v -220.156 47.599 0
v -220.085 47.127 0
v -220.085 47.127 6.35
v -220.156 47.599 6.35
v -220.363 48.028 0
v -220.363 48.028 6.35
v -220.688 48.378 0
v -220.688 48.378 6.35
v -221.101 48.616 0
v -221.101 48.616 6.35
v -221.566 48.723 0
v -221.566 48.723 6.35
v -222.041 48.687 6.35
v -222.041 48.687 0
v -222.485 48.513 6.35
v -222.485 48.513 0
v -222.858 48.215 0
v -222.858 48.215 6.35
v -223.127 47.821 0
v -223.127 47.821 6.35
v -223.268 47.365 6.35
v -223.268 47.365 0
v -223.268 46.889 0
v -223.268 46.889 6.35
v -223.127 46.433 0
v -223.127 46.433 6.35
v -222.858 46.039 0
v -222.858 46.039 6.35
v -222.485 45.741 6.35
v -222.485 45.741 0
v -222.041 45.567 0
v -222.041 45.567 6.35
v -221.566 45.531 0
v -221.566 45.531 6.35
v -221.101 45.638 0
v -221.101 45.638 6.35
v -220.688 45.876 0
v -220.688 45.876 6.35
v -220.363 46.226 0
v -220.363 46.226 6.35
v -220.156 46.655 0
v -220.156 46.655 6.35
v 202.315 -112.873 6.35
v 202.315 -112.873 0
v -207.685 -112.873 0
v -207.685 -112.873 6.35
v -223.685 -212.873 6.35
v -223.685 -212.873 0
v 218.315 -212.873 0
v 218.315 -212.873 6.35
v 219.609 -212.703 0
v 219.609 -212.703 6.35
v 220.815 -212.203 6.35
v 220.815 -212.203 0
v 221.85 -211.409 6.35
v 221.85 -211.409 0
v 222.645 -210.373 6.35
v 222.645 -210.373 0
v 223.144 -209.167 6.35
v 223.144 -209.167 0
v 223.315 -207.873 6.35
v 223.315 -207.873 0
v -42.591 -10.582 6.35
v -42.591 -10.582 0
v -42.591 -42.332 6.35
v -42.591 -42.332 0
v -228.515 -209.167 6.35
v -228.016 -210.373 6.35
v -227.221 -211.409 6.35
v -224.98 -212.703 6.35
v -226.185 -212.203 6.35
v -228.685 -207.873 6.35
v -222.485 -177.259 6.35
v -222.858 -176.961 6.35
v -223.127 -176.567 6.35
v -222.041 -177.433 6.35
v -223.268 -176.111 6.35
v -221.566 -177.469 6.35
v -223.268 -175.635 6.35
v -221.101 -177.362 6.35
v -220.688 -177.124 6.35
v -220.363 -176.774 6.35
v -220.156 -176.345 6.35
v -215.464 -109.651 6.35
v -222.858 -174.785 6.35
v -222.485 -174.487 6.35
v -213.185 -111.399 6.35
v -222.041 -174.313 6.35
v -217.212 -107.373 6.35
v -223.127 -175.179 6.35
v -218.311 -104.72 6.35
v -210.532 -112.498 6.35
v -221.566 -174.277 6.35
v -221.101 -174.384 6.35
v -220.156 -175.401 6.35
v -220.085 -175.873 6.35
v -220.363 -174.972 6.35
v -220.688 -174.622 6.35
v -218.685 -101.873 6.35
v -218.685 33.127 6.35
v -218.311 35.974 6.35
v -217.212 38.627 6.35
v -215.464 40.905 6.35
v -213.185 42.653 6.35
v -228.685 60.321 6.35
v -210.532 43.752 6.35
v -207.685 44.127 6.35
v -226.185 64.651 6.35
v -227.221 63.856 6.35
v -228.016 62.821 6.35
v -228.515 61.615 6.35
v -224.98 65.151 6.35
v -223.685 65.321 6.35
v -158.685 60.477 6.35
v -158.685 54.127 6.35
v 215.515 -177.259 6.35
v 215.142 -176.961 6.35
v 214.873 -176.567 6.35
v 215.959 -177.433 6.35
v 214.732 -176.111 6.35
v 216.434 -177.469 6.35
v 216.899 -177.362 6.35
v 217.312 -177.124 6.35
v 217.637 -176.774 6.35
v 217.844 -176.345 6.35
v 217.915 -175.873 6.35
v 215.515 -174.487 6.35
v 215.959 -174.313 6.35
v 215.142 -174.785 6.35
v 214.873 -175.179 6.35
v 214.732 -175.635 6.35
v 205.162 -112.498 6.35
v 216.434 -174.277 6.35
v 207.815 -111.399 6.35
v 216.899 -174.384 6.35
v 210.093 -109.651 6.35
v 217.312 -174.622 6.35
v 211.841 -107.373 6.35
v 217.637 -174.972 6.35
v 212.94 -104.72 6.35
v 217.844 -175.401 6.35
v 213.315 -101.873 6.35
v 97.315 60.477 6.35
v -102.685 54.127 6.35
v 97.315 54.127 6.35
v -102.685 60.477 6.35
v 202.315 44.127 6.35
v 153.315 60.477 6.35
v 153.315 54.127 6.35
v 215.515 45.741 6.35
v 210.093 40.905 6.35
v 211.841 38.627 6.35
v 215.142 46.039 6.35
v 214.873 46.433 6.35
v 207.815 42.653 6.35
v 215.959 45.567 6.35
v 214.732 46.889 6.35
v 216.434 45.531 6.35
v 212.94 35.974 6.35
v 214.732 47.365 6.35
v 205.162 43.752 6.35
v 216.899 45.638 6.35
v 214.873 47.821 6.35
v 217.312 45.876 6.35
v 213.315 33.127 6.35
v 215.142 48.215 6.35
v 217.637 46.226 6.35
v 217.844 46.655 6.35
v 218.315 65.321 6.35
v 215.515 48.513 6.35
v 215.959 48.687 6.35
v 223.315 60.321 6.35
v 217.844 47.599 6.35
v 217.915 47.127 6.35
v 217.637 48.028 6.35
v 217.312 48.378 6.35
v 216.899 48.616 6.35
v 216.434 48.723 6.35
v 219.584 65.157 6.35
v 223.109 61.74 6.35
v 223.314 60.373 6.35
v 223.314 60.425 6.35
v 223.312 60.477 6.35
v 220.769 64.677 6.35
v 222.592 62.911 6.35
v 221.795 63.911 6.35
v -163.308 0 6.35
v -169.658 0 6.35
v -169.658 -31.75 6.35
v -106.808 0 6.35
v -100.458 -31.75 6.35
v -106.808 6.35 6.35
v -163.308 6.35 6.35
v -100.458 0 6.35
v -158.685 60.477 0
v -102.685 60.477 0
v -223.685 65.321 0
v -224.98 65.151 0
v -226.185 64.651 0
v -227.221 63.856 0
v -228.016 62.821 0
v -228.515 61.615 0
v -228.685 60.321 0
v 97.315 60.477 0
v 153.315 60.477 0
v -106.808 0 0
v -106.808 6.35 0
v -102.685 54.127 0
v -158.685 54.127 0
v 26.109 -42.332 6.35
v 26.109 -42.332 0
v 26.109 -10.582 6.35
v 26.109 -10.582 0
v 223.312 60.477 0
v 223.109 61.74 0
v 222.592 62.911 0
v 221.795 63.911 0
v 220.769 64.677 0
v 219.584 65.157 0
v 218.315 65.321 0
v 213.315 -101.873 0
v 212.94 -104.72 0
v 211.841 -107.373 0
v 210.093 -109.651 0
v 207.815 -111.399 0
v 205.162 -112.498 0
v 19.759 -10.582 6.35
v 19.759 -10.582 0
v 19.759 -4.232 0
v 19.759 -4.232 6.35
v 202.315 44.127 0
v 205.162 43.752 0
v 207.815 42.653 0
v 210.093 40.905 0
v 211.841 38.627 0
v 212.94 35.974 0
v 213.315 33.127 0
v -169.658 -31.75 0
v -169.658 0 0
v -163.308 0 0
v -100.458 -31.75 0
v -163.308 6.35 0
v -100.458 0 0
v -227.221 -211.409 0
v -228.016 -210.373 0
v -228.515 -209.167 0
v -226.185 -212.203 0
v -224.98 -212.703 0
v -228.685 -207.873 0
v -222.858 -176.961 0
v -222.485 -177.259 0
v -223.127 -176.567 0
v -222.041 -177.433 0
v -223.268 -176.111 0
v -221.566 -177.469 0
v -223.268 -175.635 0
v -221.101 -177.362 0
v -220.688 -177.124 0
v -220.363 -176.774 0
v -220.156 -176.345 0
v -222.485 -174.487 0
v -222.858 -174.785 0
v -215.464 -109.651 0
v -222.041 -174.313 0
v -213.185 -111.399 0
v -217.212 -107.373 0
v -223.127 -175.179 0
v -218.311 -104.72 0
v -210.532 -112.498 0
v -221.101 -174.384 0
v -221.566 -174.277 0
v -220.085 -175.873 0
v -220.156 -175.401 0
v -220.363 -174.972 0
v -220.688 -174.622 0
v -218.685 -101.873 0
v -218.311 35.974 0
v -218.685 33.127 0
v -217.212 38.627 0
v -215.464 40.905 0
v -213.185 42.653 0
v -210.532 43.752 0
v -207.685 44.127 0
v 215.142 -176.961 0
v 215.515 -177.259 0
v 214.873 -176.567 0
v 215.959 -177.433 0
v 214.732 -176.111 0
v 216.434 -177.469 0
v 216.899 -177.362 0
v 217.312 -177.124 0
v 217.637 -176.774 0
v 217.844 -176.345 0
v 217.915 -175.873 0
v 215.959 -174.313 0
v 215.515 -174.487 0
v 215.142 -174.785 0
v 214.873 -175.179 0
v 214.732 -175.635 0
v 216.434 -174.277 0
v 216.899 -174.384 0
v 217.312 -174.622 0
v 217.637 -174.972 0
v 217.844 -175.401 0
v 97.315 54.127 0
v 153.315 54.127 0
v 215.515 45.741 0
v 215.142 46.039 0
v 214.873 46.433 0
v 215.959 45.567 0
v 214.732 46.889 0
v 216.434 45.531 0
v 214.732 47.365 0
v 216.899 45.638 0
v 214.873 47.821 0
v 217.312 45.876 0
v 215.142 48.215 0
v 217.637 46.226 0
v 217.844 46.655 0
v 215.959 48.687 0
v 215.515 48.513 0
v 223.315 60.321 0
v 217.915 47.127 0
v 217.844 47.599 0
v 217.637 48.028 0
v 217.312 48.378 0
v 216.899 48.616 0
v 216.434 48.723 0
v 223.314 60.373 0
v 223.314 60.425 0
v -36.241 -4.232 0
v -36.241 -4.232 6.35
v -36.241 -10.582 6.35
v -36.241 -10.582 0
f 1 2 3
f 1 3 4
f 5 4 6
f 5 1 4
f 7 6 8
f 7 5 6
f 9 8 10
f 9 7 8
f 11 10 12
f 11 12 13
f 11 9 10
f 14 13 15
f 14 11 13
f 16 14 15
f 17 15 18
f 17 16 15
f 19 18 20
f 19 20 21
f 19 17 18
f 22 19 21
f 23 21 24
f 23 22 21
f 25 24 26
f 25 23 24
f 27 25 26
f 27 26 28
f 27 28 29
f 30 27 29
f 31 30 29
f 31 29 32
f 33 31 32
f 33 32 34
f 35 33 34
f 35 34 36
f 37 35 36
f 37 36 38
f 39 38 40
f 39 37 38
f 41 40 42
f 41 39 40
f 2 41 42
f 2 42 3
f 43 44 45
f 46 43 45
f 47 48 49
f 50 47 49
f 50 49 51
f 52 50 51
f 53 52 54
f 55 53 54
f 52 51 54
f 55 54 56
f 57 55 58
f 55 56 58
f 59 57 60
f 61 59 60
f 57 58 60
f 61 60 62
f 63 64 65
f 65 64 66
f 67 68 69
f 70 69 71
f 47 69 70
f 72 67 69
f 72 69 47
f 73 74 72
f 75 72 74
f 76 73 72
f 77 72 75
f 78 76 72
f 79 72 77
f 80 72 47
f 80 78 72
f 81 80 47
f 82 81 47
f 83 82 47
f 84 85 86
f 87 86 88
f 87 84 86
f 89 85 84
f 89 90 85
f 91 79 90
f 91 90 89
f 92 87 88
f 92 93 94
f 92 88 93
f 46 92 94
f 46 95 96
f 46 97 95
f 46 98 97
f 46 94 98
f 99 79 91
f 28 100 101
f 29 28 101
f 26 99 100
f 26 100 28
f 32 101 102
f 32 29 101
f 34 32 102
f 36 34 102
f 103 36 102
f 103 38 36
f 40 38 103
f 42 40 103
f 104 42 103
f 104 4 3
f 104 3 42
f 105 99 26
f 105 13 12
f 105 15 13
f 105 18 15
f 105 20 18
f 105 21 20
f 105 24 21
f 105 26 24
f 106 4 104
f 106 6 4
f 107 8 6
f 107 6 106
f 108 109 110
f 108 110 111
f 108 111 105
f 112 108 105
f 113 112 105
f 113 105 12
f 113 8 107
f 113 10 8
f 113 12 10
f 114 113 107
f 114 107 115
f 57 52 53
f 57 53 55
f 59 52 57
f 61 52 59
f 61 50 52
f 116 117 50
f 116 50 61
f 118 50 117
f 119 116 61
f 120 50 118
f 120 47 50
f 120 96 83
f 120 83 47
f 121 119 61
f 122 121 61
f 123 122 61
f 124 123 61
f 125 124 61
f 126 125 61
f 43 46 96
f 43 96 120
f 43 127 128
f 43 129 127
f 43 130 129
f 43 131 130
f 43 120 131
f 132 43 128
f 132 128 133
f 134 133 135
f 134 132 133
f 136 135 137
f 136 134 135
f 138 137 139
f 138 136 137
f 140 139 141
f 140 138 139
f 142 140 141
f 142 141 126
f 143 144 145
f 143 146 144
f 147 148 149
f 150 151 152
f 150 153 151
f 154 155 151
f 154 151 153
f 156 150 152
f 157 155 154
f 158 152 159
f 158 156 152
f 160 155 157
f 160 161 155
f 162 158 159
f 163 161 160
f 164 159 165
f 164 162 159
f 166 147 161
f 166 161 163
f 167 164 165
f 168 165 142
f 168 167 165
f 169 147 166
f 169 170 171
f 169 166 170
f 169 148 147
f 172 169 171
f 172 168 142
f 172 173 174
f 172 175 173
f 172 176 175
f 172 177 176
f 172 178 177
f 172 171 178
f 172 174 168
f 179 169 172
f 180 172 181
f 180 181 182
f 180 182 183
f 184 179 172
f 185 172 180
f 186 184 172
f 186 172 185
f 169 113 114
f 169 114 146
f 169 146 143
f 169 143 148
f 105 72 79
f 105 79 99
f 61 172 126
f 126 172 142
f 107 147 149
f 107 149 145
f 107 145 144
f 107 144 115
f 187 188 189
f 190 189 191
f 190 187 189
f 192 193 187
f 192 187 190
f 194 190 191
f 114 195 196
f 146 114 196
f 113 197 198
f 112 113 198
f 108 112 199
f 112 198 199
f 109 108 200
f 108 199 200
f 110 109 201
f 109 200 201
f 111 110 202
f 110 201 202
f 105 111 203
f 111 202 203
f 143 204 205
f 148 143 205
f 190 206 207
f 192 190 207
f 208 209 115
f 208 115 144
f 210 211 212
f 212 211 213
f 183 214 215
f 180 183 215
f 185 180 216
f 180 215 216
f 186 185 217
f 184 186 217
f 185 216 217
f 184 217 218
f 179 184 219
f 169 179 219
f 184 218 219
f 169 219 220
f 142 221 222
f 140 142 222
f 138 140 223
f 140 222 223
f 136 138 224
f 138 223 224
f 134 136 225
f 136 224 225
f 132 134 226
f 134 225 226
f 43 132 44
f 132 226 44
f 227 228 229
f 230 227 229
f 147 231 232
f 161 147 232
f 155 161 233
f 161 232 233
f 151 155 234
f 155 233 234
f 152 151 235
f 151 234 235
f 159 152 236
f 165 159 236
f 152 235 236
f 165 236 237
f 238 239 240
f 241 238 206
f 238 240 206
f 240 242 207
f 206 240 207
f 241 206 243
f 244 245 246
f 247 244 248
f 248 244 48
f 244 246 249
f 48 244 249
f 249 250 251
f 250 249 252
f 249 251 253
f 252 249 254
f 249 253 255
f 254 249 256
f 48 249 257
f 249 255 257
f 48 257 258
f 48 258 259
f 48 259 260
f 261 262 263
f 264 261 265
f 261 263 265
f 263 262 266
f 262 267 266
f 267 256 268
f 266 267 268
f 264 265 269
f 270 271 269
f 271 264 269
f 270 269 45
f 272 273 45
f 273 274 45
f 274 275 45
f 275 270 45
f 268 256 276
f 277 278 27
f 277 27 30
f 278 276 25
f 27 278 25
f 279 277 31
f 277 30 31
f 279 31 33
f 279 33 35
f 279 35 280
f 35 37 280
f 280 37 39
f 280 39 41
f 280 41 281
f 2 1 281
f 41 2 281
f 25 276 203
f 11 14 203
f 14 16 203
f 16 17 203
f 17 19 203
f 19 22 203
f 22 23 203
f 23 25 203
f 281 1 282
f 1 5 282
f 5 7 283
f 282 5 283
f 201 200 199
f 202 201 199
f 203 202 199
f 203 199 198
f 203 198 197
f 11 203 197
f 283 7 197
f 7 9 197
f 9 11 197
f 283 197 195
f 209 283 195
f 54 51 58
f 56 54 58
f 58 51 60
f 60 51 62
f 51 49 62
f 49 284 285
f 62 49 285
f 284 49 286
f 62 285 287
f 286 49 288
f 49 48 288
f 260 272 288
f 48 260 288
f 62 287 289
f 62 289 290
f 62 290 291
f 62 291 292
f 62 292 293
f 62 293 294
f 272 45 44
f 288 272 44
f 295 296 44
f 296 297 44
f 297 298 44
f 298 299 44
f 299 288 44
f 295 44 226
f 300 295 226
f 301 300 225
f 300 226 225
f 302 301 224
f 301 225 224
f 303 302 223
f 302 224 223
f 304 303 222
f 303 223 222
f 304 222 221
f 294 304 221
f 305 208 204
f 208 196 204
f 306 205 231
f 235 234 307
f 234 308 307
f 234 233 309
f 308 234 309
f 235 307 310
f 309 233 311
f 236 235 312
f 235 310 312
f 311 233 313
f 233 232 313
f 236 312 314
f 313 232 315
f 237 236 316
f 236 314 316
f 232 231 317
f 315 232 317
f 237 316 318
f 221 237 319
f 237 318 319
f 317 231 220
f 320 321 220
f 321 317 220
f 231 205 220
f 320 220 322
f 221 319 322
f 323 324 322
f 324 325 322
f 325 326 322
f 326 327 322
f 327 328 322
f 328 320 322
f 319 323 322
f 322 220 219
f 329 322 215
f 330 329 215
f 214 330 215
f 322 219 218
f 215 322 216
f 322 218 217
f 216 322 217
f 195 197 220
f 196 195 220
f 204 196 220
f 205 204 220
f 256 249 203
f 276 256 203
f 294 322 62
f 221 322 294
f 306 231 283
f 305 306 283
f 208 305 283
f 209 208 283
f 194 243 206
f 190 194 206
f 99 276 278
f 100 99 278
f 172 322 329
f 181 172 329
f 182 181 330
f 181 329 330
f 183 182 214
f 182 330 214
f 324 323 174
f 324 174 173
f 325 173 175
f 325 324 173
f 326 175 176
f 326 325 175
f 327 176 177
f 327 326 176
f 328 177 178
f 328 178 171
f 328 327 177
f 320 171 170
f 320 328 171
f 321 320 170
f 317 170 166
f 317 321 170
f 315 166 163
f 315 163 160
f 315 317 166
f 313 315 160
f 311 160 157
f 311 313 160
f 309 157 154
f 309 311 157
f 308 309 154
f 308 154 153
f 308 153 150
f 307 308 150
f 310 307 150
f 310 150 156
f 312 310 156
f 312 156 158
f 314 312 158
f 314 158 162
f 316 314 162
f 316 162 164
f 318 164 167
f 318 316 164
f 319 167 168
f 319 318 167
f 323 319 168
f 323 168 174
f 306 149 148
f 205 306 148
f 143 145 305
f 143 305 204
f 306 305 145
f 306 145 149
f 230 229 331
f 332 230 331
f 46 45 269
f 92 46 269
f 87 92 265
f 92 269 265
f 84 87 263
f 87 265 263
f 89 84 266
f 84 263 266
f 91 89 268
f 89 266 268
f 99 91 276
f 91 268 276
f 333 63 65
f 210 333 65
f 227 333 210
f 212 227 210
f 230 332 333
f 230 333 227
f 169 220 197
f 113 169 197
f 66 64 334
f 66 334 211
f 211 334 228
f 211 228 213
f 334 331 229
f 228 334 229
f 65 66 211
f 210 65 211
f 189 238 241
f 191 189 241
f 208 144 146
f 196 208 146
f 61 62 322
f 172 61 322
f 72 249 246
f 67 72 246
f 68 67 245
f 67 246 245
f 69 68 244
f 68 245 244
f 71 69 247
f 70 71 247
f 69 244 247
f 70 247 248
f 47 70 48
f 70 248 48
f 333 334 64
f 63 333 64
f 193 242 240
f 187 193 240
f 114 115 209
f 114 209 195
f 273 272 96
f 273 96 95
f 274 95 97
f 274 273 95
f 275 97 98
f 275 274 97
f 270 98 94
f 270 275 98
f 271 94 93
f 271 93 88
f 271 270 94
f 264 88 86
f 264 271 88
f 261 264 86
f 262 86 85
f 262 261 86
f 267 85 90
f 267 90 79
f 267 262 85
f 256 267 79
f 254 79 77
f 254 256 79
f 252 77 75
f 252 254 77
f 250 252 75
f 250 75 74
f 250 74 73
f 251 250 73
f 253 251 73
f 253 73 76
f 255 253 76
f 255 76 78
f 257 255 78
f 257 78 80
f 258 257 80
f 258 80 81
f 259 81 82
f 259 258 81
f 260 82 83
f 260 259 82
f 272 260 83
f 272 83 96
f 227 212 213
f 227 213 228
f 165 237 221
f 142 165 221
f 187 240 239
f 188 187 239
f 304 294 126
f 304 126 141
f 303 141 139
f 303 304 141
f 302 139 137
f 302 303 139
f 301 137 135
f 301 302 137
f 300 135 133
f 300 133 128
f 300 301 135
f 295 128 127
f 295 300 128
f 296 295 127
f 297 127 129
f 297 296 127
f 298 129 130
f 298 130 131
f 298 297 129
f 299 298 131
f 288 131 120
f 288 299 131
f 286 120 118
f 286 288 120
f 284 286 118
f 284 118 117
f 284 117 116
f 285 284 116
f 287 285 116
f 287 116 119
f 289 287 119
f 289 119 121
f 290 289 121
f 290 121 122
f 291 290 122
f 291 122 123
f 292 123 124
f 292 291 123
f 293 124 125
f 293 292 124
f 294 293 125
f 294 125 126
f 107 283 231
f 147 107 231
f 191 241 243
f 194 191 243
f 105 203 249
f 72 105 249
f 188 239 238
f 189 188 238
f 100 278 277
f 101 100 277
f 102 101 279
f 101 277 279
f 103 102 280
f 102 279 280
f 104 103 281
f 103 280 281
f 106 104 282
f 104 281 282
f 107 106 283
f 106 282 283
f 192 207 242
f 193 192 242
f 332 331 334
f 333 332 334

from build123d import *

# Parameters (mm, degrees)
F0_R     = 1.6
F0_W     = 56
F0_H     = 6.35
F1_DEPTH = 6.35


with BuildPart() as f1:
    # F0 (on Top) → F1 (new body)
    with BuildSketch(Plane.XY):
        with BuildLine():
            Line((223.314591, 47.126997), (223.314591, 49.126997))
            Line((223.314591, 49.126997), (223.314591, 60.320925))
            ThreePointArc((223.314591, 60.320925), (223.313982, 60.398971), (223.312155, 60.476997))
            ThreePointArc((223.312155, 60.476997), (221.794508, 63.911215), (218.314591, 65.320925))
            Line((218.314591, 65.320925), (-118.902974, 65.320925))
            Line((-118.902974, 65.320925), (-223.685409, 65.320925))
            ThreePointArc((-223.685409, 65.320925), (-227.220943, 63.856459), (-228.685409, 60.320925))
            Line((-228.685409, 60.320925), (-228.685409, -175.873003))
            Line((-228.685409, -175.873003), (-228.685409, -177.873003))
            Line((-228.685409, -177.873003), (-228.685409, -207.873003))
            ThreePointArc((-228.685409, -207.873003), (-227.220943, -211.408537), (-223.685409, -212.873003))
            Line((-223.685409, -212.873003), (-64.44785, -212.873003))
            Line((-64.44785, -212.873003), (218.314591, -212.873003))
            ThreePointArc((218.314591, -212.873003), (221.850125, -211.408537), (223.314591, -207.873003))
            Line((223.314591, -207.873003), (223.314591, -177.873003))
            Line((223.314591, -177.873003), (223.314591, -175.873003))
            Line((223.314591, -175.873003), (223.314591, 47.126997))
        make_face()
        with Locations((-221.685409, -175.873003)):
            Circle(F0_R, mode=Mode.SUBTRACT)
        with Locations((216.314591, -175.873003)):
            Circle(F0_R, mode=Mode.SUBTRACT)
        with Locations((-221.685409, 47.126997)):
            Circle(F0_R, mode=Mode.SUBTRACT)
        with Locations((-130.685409, 57.301997)):
            Rectangle(F0_W, F0_H, mode=Mode.SUBTRACT)
        with BuildLine():
            Line((213.314591, 33.126997), (213.314591, -31.178514))
            Line((213.314591, -31.178514), (213.314591, -101.873003))
            ThreePointArc((213.314591, -101.873003), (210.092766, -109.651177), (202.314591, -112.873003))
            Line((202.314591, -112.873003), (-207.685409, -112.873003))
            ThreePointArc((-207.685409, -112.873003), (-215.463583, -109.651177), (-218.685409, -101.873003))
            Line((-218.685409, -101.873003), (-218.685409, -34.373003))
            Line((-218.685409, -34.373003), (-218.685409, 33.126997))
            ThreePointArc((-218.685409, 33.126997), (-215.463583, 40.905172), (-207.685409, 44.126997))
            Line((-207.685409, 44.126997), (202.314591, 44.126997))
            ThreePointArc((202.314591, 44.126997), (210.092766, 40.905172), (213.314591, 33.126997))
        make_face(mode=Mode.SUBTRACT)
        with Locations((125.314591, 57.301997)):
            Rectangle(F0_W, F0_H, mode=Mode.SUBTRACT)
        with Locations((216.314591, 47.126997)):
            Circle(F0_R, mode=Mode.SUBTRACT)
        Polygon((-106.808259, 6.35), (-163.308259, 6.35), (-163.308259, 0), (-169.658259, 0), (-169.658259, -31.75), (-163.308259, -31.75), (-107.308259, -31.75), (-100.458259, -31.75), (-100.458259, 0), (-106.808259, 0), align=None)
        Polygon((19.75851, -4.2318), (-36.24149, -4.2318), (-36.24149, -10.5818), (-42.59149, -10.5818), (-42.59149, -42.3318), (-36.24149, -42.3318), (19.75851, -42.3318), (26.10851, -42.3318), (26.10851, -10.5818), (19.75851, -10.5818), align=None)
    extrude(amount=F1_DEPTH)


solid = f1.part
